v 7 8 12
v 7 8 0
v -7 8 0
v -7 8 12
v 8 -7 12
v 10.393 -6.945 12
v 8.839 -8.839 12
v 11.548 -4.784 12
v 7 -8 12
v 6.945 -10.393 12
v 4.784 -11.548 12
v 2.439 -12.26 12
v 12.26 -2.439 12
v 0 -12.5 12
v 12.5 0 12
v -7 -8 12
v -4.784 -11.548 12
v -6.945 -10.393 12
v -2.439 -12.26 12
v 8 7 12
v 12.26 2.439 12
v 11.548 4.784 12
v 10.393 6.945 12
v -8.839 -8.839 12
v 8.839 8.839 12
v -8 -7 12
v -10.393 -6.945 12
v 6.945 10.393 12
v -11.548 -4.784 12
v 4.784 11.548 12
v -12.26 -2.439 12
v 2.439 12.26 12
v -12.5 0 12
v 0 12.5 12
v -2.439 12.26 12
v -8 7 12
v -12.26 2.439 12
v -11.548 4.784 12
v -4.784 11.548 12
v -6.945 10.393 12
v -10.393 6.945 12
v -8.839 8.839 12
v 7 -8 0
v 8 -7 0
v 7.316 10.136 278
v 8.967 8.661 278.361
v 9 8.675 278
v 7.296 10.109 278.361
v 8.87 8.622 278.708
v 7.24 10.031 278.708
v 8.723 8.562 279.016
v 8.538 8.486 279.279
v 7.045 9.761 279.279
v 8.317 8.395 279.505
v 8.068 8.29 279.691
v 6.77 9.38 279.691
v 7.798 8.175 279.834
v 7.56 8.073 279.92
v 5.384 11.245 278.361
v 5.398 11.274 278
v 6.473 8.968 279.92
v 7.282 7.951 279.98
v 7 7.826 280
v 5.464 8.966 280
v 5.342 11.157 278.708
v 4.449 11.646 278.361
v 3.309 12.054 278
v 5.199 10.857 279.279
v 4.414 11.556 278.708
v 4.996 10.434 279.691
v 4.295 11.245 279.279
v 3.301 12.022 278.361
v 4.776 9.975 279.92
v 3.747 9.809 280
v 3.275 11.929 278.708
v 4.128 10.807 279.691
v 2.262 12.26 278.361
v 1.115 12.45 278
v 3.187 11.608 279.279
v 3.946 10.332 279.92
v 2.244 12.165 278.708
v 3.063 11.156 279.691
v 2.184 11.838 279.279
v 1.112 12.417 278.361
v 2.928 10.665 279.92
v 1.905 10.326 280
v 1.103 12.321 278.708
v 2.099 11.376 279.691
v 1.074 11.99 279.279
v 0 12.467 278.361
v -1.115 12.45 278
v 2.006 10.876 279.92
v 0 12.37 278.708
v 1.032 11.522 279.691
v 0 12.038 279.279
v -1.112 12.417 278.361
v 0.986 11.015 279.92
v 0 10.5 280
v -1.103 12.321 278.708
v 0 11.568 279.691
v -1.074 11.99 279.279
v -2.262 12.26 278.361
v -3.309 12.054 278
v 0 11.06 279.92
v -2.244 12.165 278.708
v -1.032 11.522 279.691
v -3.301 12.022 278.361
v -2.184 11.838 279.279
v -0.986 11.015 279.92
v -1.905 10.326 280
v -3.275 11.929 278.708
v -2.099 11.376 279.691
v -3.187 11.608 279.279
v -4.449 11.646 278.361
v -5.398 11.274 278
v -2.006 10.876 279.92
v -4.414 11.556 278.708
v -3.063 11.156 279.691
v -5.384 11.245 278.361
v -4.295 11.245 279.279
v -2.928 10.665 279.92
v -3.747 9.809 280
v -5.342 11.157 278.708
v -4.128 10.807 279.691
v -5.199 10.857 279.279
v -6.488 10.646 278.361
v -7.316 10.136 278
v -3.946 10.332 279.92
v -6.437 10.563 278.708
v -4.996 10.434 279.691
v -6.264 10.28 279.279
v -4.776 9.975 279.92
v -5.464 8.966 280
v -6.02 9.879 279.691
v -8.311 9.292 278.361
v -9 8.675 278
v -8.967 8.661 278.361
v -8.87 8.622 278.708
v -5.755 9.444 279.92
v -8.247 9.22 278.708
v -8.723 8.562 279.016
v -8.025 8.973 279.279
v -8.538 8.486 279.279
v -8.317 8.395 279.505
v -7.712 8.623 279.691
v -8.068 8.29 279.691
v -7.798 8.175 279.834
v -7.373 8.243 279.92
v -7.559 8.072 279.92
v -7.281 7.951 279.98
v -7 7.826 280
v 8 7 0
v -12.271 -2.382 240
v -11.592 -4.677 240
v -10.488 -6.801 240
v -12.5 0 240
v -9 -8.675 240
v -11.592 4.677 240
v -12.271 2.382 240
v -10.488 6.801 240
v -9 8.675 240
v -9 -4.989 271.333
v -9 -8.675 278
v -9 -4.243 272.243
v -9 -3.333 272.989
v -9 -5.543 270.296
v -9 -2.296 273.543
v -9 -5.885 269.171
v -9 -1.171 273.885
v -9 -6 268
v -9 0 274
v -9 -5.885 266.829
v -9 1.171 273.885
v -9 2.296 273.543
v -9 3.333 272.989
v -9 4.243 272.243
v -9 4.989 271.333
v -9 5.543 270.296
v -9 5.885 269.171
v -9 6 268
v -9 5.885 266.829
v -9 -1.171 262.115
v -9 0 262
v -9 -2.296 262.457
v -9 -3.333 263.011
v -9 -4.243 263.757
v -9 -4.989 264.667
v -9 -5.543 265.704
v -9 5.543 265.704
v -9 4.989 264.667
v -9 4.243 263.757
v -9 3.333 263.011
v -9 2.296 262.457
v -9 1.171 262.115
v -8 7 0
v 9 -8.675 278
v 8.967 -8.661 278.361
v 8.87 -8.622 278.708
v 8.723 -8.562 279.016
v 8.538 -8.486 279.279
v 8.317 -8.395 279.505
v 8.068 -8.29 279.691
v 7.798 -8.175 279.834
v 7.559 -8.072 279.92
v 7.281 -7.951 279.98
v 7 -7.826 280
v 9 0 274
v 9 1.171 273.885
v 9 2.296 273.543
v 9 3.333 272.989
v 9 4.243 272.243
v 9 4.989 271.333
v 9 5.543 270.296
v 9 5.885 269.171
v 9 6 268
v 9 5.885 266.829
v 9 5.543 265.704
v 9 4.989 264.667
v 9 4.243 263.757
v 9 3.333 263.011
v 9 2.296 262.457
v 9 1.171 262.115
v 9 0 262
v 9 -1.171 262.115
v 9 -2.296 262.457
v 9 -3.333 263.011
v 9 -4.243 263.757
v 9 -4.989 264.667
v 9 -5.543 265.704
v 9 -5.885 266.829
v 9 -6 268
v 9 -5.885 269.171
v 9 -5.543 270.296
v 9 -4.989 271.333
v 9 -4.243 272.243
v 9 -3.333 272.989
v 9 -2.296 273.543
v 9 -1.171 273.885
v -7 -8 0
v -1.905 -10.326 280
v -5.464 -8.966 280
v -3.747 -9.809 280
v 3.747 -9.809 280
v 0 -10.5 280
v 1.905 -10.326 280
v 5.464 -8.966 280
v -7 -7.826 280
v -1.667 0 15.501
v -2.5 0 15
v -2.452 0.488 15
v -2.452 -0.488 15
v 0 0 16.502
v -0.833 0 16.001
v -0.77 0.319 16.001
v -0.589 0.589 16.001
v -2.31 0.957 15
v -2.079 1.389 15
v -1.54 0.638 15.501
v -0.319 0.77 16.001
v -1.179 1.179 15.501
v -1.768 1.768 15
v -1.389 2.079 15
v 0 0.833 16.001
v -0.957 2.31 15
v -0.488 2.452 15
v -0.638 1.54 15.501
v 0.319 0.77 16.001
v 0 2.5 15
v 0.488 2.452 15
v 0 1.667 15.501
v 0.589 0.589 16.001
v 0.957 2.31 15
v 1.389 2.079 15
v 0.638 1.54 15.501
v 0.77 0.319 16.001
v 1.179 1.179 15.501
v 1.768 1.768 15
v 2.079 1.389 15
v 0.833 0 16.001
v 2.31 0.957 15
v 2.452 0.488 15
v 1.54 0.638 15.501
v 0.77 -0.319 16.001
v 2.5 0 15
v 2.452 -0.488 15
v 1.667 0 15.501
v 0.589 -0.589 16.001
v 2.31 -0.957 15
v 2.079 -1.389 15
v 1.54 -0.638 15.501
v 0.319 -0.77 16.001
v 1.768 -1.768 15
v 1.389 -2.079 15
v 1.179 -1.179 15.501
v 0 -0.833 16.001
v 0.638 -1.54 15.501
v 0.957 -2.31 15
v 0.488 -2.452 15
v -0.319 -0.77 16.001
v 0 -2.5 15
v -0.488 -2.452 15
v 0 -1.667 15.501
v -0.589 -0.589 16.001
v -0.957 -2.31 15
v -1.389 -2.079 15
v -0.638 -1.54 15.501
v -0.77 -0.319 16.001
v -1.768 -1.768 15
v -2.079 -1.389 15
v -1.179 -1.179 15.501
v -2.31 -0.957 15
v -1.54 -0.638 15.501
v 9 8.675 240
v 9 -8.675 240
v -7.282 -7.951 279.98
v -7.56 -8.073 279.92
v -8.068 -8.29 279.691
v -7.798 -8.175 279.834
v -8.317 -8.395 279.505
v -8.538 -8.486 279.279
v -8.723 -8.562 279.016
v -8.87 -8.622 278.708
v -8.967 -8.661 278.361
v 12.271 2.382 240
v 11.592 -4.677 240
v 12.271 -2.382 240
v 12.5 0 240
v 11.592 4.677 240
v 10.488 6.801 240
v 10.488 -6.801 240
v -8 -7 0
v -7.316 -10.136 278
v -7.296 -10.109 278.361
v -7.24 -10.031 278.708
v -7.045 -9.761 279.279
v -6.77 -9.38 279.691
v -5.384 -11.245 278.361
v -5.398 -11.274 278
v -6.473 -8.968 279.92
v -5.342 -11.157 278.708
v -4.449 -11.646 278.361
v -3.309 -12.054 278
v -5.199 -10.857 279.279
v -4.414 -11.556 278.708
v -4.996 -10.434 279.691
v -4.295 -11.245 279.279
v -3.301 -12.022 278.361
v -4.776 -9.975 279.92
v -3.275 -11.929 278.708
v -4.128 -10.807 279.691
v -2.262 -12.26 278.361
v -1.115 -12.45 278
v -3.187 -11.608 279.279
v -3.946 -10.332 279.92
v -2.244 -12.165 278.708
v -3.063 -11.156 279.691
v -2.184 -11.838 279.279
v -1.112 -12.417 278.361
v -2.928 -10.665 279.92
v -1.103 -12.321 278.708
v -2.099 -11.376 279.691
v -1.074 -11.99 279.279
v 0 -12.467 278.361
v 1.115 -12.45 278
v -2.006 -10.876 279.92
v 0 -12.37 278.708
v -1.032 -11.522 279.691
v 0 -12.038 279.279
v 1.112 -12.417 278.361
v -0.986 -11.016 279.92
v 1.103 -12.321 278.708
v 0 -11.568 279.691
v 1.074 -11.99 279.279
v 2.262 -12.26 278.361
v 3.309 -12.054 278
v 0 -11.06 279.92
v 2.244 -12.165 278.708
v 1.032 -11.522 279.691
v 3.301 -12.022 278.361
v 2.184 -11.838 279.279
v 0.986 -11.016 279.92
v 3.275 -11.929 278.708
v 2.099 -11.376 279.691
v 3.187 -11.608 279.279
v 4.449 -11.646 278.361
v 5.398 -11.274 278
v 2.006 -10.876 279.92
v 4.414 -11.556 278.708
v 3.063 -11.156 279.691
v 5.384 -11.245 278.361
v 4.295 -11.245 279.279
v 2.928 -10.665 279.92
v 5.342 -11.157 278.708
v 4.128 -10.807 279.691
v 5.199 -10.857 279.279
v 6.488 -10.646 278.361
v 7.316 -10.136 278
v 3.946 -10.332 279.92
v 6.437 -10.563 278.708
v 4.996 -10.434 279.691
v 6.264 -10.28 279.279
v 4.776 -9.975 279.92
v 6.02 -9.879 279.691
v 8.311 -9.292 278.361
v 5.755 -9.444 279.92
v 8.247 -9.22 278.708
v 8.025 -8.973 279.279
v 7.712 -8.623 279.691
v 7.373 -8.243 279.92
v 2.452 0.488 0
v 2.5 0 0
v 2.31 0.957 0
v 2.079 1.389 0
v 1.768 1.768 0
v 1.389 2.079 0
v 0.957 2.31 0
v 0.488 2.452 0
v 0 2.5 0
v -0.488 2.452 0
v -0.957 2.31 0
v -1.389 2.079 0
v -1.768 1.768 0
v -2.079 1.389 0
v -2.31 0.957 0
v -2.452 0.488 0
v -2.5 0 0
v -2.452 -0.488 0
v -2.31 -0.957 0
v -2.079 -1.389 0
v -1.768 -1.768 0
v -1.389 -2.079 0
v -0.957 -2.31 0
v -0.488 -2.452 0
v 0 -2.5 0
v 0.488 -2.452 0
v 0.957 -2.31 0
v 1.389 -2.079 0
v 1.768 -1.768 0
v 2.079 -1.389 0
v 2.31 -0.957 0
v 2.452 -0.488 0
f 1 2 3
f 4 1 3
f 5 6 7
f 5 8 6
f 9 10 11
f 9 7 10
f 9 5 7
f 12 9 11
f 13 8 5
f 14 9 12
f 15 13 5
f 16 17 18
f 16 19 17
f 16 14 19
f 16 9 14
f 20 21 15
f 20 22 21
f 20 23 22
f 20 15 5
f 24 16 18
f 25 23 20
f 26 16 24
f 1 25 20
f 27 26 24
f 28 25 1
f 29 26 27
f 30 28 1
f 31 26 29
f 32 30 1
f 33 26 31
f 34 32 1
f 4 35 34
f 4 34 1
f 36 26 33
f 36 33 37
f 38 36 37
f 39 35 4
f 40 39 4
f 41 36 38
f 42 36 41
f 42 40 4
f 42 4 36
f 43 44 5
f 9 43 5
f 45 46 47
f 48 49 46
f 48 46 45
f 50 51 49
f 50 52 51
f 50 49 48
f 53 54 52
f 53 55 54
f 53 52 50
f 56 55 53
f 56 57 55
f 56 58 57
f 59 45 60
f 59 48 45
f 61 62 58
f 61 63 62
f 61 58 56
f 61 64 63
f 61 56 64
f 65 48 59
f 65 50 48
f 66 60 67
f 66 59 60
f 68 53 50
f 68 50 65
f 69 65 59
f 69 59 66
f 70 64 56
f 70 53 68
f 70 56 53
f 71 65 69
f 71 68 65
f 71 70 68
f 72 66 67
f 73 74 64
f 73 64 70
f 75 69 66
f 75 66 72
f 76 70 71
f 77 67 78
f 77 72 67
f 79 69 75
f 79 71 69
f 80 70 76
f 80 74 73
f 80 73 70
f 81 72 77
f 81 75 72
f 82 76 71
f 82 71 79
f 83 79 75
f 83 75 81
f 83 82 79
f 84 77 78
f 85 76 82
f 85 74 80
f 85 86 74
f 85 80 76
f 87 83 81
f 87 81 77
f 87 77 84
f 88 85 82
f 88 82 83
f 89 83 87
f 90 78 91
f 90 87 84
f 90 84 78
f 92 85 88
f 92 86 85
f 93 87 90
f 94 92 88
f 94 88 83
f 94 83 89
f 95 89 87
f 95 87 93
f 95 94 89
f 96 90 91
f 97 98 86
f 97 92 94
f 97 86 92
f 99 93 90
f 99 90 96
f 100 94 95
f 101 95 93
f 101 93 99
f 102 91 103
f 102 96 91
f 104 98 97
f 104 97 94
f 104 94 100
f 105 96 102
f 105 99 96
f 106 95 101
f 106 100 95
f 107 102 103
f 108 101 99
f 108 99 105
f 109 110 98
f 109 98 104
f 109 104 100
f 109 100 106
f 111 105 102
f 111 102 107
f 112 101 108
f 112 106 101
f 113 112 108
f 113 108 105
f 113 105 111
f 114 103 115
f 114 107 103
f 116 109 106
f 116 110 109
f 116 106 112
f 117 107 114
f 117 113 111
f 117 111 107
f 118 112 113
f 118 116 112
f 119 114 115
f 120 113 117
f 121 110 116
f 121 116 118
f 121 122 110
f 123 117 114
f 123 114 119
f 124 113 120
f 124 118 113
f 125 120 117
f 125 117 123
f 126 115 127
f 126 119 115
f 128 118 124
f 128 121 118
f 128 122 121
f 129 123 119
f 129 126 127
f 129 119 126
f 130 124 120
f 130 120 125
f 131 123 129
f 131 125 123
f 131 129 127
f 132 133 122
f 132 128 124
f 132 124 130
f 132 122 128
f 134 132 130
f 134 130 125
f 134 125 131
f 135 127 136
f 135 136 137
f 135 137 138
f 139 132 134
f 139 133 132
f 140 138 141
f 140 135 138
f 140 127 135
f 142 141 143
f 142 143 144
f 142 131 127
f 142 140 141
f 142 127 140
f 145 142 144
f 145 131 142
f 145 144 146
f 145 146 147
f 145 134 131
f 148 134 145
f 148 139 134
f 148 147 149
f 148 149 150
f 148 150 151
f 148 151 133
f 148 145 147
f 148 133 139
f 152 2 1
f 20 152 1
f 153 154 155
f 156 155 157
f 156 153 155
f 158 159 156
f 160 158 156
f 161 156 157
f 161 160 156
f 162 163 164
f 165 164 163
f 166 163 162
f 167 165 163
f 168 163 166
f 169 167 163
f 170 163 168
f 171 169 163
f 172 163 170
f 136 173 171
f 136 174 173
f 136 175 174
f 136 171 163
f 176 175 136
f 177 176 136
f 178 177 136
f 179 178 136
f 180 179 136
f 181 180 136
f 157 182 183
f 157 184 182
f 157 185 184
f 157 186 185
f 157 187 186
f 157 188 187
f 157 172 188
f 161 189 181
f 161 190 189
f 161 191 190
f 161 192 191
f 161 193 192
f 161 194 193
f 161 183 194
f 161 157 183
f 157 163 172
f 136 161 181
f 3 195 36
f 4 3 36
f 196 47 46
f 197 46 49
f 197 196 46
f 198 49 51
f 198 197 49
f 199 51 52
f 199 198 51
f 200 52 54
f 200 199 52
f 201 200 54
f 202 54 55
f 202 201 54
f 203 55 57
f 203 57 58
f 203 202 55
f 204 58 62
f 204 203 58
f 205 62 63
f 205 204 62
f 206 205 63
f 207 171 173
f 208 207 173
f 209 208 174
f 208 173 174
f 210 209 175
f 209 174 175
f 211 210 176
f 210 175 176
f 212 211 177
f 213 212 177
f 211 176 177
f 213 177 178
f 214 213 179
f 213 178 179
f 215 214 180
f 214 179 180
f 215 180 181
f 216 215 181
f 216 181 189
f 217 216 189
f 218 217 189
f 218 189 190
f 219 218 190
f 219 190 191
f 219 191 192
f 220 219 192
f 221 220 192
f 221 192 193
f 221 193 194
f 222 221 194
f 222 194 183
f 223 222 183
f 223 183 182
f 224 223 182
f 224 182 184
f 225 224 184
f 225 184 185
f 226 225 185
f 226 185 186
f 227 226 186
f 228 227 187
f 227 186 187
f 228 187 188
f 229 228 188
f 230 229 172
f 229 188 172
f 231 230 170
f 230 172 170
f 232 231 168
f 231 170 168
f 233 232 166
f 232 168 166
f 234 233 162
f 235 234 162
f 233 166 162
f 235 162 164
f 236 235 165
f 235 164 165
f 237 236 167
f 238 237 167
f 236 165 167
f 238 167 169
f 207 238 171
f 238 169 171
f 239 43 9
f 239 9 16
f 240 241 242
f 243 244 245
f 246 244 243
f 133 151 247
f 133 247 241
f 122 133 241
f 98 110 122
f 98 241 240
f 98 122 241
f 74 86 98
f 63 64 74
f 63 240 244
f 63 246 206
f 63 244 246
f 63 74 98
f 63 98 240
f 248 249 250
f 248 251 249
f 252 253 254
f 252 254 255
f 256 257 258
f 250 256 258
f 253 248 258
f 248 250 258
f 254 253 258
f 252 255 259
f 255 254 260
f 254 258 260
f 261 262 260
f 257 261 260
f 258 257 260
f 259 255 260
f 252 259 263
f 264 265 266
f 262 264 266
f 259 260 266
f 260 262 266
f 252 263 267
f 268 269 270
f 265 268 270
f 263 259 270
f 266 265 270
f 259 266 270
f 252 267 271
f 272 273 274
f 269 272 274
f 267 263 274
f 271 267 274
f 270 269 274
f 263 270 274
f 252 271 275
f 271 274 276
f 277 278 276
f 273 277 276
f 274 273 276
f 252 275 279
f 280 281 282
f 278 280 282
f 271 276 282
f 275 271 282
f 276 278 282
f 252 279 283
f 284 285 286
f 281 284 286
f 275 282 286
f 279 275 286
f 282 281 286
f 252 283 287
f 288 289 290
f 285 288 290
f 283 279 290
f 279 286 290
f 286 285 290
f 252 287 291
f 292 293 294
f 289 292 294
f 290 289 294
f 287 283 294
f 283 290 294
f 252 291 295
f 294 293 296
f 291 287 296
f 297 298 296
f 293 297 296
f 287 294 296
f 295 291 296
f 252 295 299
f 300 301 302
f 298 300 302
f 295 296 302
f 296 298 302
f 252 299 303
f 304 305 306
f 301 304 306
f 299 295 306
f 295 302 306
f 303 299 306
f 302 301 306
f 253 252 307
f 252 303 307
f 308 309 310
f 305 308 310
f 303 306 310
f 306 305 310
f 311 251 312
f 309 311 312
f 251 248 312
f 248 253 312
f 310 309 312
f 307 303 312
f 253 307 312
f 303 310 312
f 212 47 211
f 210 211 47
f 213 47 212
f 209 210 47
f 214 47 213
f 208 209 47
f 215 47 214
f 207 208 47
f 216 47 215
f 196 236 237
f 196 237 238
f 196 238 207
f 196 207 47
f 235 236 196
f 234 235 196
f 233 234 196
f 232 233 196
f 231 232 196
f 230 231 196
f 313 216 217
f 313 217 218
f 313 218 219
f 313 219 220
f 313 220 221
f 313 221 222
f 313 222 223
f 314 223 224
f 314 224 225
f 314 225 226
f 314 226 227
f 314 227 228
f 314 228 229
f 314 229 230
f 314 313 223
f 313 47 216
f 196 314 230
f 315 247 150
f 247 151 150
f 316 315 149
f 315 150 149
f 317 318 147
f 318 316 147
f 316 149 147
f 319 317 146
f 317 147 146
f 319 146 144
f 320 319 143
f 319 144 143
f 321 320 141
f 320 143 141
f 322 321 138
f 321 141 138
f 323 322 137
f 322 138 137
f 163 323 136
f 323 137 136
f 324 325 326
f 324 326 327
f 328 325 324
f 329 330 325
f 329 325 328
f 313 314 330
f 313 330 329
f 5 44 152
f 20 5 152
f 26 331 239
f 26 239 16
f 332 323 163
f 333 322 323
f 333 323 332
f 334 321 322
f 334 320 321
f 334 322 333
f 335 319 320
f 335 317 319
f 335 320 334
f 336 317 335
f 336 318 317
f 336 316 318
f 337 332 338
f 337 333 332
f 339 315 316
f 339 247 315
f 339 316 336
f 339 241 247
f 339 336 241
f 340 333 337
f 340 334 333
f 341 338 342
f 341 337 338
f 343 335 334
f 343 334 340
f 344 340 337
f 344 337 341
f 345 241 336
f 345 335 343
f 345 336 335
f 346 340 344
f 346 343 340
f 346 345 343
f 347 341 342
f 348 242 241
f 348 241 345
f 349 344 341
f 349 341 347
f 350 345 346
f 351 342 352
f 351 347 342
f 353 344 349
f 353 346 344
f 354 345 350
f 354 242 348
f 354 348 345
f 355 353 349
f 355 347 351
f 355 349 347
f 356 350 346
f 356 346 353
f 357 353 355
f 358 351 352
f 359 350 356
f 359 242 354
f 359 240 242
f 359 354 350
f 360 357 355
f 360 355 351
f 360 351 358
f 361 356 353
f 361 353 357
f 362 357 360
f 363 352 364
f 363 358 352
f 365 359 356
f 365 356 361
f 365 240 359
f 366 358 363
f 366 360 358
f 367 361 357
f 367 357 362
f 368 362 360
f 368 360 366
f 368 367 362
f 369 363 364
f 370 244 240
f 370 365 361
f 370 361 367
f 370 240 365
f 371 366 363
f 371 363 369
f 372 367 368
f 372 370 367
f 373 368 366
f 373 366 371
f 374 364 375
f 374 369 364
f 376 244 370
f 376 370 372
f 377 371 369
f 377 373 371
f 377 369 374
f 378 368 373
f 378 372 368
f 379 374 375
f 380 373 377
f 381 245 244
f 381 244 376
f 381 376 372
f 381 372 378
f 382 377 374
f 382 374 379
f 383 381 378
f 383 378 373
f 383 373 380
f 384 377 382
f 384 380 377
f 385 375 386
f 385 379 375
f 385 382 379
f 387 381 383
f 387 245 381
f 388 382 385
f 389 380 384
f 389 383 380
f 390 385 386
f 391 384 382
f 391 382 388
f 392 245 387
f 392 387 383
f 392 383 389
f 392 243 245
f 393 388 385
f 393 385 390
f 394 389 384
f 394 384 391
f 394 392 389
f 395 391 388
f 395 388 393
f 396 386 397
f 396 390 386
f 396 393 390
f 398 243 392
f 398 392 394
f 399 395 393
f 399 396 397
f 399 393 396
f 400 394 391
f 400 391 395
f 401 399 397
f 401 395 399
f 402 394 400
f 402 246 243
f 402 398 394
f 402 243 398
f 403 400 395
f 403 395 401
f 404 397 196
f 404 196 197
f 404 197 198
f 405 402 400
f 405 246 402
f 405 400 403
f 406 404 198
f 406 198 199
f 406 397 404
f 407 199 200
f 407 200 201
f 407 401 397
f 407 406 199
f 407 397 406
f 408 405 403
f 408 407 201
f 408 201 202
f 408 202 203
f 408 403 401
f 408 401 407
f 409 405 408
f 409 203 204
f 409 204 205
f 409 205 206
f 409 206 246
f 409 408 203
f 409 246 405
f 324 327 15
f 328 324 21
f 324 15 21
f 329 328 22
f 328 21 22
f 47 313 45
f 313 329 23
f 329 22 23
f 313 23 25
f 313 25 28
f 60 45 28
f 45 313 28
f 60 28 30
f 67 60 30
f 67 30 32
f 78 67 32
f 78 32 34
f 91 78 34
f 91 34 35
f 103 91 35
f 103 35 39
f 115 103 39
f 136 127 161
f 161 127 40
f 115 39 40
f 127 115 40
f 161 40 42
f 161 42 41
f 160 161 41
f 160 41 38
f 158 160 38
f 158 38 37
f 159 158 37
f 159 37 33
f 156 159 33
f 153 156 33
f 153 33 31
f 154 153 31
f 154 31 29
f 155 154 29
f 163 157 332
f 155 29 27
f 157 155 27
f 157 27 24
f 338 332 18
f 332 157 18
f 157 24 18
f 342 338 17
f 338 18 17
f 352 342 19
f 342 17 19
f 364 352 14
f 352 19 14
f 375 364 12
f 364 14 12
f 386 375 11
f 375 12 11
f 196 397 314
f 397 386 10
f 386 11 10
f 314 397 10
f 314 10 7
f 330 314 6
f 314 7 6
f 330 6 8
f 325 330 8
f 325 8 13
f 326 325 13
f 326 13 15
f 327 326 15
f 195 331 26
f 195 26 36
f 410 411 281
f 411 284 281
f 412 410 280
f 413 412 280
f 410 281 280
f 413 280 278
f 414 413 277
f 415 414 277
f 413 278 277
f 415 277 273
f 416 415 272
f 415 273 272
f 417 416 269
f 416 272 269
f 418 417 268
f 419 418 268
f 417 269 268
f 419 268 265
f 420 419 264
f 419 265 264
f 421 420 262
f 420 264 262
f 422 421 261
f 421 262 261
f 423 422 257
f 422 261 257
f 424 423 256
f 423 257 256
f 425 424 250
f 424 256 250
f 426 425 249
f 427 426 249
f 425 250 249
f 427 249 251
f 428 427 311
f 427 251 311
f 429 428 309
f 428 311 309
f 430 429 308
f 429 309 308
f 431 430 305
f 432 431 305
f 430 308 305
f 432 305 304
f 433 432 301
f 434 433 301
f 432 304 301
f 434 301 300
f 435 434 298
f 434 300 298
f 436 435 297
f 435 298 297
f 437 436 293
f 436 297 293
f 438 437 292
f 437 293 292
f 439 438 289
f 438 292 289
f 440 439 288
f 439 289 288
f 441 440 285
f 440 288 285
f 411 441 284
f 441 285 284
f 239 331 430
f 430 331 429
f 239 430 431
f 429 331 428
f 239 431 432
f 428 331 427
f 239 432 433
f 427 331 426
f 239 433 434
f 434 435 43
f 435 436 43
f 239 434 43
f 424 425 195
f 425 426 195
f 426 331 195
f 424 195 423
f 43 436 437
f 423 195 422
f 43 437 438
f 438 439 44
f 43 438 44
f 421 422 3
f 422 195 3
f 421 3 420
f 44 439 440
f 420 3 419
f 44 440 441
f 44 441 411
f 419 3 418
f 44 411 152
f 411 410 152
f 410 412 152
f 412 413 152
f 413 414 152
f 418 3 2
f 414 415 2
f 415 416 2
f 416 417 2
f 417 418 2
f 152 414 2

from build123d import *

# Parameters (mm, degrees)
SKETCH1_R             = 12.5
BOSS_EXTRUDE1_DEPTH   = 280
CUT_EXTRUDE1_START    = -40
CUT_EXTRUDE1_DEPTH    = 40
SKETCH3_R             = 6
CUT_EXTRUDE2_DEPTH    = 282.102294548
FILLET1_R             = 2
SKETCH4_R             = 12.5
SKETCH4_W             = 16
SKETCH4_H             = 16
CUT_EXTRUDE3_DEPTH    = 12
M6_TAPPED_HOLE1_D     = 5
M6_TAPPED_HOLE1_DEPTH = 15
M6_TAPPED_HOLE1_TIP   = 1.502151548
CHAMFER1_SIZE         = 1


with BuildPart() as part:
    # Sketch1 → Boss-Extrude1 (new body)
    with BuildSketch(Plane.XY):
        Circle(SKETCH1_R)
    extrude(amount=BOSS_EXTRUDE1_DEPTH)

    # Sketch2 → Cut-Extrude1 (cut)
    with BuildSketch(Plane.XY.offset(280).offset(CUT_EXTRUDE1_START)):
        with BuildLine():
            Line((-9, -8.674675786), (-9, 8.674675786))
            ThreePointArc((-9, 8.674675786), (-12.5, 0), (-9, -8.674675786))
        make_face()
        with BuildLine():
            ThreePointArc((9, -8.674675786), (12.5, 0), (9, 8.674675786))
            Line((9, 8.674675786), (9, -8.674675786))
        make_face()
    extrude(amount=CUT_EXTRUDE1_DEPTH, mode=Mode.SUBTRACT)

    # Sketch3 → Cut-Extrude2 (cut, through all)
    with BuildSketch(Plane.ZY.offset(9)):
        with Locations((268, 0)):
            Circle(SKETCH3_R)
    extrude(amount=-CUT_EXTRUDE2_DEPTH, mode=Mode.SUBTRACT)

    # Fillet1
    fillet1_edges = [part.edges().sort_by_distance(p)[0] for p in [
        (0, 12.5, 280),
        (9, 0, 280),
        (0, -12.5, 280),
        (-9, 0, 280),
    ]]
    fillet(fillet1_edges, radius=FILLET1_R)

    # Sketch4 → Cut-Extrude3 (cut)
    with BuildSketch(Plane(origin=(0, 0, 0), x_dir=(-1, 0, 0), z_dir=(0, 0, -1))):
        Circle(SKETCH4_R)
        Rectangle(SKETCH4_W, SKETCH4_H, mode=Mode.SUBTRACT)
    extrude(amount=-CUT_EXTRUDE3_DEPTH, mode=Mode.SUBTRACT)

    # M6 Tapped Hole1
    with Locations(Plane(origin=(0, 0, 0), x_dir=(-1, 0, 0), z_dir=(0, 0, -1))):
        with Locations((0, 0)):
            Hole(M6_TAPPED_HOLE1_D / 2, depth=M6_TAPPED_HOLE1_DEPTH)
            with Locations((0, 0, -(M6_TAPPED_HOLE1_DEPTH + M6_TAPPED_HOLE1_TIP / 2))):  # 118° drill point
                Cone(0, M6_TAPPED_HOLE1_D / 2, M6_TAPPED_HOLE1_TIP, mode=Mode.SUBTRACT)

    # Chamfer1
    chamfer1_edges = [part.edges().sort_by_distance(p)[0] for p in [
        (-8, -8, 6),
        (-8, 8, 6),
        (8, -8, 6),
        (8, 8, 6),
    ]]
    chamfer(chamfer1_edges, length=CHAMFER1_SIZE)


solid = part.part
